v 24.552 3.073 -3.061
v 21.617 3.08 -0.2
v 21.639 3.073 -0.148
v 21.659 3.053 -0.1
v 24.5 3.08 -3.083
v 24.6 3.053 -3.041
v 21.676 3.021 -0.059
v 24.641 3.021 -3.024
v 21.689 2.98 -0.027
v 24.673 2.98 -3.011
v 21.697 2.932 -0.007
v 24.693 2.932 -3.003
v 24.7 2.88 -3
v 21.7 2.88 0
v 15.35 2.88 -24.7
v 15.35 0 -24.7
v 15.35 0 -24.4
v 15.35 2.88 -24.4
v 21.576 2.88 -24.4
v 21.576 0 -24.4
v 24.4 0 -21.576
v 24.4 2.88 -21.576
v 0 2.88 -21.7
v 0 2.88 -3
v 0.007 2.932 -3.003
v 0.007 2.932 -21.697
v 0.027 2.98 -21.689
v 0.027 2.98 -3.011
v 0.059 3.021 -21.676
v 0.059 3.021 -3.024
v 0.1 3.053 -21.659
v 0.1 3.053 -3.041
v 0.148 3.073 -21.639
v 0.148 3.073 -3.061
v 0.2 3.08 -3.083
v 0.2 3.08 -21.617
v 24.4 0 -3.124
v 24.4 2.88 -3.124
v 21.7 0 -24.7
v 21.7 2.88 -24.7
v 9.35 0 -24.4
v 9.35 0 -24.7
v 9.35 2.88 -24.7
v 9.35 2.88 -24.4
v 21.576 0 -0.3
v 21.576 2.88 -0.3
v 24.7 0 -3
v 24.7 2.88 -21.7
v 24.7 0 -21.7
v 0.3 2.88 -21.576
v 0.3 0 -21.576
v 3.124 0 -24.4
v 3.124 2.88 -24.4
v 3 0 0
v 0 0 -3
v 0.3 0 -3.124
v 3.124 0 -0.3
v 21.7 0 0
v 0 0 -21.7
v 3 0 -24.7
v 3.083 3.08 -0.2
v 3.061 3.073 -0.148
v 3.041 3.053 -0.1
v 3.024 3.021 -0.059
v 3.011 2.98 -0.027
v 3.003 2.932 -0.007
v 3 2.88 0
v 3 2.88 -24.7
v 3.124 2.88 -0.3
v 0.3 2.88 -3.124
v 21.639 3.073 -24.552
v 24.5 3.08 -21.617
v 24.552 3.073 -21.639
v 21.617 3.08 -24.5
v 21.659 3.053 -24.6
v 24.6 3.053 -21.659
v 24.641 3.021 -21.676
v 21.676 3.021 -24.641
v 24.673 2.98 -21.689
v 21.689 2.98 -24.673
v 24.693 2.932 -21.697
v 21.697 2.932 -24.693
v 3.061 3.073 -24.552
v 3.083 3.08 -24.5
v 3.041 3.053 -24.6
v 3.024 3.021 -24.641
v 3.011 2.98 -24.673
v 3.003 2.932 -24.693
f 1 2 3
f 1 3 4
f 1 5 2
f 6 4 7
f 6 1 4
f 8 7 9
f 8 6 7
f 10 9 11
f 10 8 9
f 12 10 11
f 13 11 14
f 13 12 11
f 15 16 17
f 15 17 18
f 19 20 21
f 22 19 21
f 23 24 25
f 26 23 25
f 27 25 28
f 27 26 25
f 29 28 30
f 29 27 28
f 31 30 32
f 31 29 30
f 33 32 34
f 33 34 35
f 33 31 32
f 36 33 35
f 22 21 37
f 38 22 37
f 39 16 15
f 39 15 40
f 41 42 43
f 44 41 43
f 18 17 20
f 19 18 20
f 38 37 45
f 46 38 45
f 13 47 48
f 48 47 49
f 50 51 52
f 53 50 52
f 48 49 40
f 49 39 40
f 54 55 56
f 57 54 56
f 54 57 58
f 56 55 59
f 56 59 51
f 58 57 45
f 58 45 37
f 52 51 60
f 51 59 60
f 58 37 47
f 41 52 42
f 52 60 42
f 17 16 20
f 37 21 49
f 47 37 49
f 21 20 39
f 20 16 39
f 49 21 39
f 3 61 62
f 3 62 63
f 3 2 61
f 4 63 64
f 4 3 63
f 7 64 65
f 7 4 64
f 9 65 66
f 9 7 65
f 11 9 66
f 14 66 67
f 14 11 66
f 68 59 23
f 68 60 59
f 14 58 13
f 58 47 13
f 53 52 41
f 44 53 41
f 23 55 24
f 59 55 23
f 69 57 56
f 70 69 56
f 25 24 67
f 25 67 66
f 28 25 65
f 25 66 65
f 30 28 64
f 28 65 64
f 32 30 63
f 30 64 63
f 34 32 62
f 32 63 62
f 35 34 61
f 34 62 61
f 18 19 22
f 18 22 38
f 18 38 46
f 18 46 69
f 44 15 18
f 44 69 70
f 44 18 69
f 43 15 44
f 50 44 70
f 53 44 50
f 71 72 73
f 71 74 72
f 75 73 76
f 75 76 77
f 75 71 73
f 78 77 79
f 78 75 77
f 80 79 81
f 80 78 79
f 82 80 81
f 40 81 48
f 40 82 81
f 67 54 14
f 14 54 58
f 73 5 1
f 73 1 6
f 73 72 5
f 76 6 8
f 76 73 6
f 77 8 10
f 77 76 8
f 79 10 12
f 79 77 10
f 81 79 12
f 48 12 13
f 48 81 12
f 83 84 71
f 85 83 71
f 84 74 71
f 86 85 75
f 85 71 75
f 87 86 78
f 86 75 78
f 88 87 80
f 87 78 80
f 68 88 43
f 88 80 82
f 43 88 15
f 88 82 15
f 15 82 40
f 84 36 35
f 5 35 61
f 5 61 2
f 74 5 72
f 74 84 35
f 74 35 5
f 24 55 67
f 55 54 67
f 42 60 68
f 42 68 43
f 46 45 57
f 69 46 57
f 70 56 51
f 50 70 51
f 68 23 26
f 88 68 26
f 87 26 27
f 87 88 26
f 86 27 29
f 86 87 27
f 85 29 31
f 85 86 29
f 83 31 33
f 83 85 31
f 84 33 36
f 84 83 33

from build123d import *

# Parameters (mm, degrees)
ESQUISSE1_W             = 24.7
ESQUISSE1_H             = 24.7
BOSS_EXTRU_1_DEPTH      = 3.08
CHANFREIN1_SIZE         = 3
CONG_1_R                = 0.2
ESQUISSE2_W             = 6
ESQUISSE2_H             = 2.88
ENL_V_MAT_EXTRU_1_DEPTH = 22.08
ENL_V_MAT_EXTRU_2_DEPTH = 2.88


with BuildPart() as part:
    # Esquisse1 → Boss.-Extru.1 (new body)
    with BuildSketch(Plane(origin=(0, 0, 0), x_dir=(1, 0, 0), z_dir=(0, 1, 0))):
        with Locations((12.35, 12.35)):
            Rectangle(ESQUISSE1_W, ESQUISSE1_H)
    extrude(amount=BOSS_EXTRU_1_DEPTH)

    # Chanfrein1
    chanfrein1_edges = [part.edges().sort_by_distance(p)[0] for p in [
        (0, 1.54, -24.7),
        (24.7, 1.54, -24.7),
        (24.7, 1.54, 0),
        (0, 1.54, 0),
    ]]
    chamfer(chanfrein1_edges, length=CHANFREIN1_SIZE)

    # Congé1
    cong_1_edges = [part.edges().sort_by_distance(p)[0] for p in [
        (0, 3.08, -12.35),
        (12.35, 3.08, -24.7),
        (12.35, 3.08, 0),
        (24.7, 3.08, -12.35),
        (1.5, 3.08, -1.5),
        (23.2, 3.08, -1.5),
        (23.2, 3.08, -23.2),
        (1.5, 3.08, -23.2),
    ]]
    fillet(cong_1_edges, radius=CONG_1_R)

    # Esquisse2 → Enlèv. mat.-Extru.1 (cut)
    with BuildSketch(Plane(origin=(0, 0, -24.7), x_dir=(-1, 0, 0), z_dir=(0, 0, -1))):
        with Locations((-12.35, 1.44)):
            Rectangle(ESQUISSE2_W, ESQUISSE2_H)
    extrude(amount=-ENL_V_MAT_EXTRU_1_DEPTH, mode=Mode.SUBTRACT)

    # Esquisse3 → Enlèv. mat.-Extru.2 (cut)
    with BuildSketch(Plane.XZ):
        Polygon((3.124264069, -24.4), (21.575735931, -24.4), (24.4, -21.575735931), (24.4, -3.124264069), (21.575735931, -0.3), (3.124264069, -0.3), (0.3, -3.124264069), (0.3, -21.575735931), align=None)
    extrude(amount=-ENL_V_MAT_EXTRU_2_DEPTH, mode=Mode.SUBTRACT)


solid = part.part
